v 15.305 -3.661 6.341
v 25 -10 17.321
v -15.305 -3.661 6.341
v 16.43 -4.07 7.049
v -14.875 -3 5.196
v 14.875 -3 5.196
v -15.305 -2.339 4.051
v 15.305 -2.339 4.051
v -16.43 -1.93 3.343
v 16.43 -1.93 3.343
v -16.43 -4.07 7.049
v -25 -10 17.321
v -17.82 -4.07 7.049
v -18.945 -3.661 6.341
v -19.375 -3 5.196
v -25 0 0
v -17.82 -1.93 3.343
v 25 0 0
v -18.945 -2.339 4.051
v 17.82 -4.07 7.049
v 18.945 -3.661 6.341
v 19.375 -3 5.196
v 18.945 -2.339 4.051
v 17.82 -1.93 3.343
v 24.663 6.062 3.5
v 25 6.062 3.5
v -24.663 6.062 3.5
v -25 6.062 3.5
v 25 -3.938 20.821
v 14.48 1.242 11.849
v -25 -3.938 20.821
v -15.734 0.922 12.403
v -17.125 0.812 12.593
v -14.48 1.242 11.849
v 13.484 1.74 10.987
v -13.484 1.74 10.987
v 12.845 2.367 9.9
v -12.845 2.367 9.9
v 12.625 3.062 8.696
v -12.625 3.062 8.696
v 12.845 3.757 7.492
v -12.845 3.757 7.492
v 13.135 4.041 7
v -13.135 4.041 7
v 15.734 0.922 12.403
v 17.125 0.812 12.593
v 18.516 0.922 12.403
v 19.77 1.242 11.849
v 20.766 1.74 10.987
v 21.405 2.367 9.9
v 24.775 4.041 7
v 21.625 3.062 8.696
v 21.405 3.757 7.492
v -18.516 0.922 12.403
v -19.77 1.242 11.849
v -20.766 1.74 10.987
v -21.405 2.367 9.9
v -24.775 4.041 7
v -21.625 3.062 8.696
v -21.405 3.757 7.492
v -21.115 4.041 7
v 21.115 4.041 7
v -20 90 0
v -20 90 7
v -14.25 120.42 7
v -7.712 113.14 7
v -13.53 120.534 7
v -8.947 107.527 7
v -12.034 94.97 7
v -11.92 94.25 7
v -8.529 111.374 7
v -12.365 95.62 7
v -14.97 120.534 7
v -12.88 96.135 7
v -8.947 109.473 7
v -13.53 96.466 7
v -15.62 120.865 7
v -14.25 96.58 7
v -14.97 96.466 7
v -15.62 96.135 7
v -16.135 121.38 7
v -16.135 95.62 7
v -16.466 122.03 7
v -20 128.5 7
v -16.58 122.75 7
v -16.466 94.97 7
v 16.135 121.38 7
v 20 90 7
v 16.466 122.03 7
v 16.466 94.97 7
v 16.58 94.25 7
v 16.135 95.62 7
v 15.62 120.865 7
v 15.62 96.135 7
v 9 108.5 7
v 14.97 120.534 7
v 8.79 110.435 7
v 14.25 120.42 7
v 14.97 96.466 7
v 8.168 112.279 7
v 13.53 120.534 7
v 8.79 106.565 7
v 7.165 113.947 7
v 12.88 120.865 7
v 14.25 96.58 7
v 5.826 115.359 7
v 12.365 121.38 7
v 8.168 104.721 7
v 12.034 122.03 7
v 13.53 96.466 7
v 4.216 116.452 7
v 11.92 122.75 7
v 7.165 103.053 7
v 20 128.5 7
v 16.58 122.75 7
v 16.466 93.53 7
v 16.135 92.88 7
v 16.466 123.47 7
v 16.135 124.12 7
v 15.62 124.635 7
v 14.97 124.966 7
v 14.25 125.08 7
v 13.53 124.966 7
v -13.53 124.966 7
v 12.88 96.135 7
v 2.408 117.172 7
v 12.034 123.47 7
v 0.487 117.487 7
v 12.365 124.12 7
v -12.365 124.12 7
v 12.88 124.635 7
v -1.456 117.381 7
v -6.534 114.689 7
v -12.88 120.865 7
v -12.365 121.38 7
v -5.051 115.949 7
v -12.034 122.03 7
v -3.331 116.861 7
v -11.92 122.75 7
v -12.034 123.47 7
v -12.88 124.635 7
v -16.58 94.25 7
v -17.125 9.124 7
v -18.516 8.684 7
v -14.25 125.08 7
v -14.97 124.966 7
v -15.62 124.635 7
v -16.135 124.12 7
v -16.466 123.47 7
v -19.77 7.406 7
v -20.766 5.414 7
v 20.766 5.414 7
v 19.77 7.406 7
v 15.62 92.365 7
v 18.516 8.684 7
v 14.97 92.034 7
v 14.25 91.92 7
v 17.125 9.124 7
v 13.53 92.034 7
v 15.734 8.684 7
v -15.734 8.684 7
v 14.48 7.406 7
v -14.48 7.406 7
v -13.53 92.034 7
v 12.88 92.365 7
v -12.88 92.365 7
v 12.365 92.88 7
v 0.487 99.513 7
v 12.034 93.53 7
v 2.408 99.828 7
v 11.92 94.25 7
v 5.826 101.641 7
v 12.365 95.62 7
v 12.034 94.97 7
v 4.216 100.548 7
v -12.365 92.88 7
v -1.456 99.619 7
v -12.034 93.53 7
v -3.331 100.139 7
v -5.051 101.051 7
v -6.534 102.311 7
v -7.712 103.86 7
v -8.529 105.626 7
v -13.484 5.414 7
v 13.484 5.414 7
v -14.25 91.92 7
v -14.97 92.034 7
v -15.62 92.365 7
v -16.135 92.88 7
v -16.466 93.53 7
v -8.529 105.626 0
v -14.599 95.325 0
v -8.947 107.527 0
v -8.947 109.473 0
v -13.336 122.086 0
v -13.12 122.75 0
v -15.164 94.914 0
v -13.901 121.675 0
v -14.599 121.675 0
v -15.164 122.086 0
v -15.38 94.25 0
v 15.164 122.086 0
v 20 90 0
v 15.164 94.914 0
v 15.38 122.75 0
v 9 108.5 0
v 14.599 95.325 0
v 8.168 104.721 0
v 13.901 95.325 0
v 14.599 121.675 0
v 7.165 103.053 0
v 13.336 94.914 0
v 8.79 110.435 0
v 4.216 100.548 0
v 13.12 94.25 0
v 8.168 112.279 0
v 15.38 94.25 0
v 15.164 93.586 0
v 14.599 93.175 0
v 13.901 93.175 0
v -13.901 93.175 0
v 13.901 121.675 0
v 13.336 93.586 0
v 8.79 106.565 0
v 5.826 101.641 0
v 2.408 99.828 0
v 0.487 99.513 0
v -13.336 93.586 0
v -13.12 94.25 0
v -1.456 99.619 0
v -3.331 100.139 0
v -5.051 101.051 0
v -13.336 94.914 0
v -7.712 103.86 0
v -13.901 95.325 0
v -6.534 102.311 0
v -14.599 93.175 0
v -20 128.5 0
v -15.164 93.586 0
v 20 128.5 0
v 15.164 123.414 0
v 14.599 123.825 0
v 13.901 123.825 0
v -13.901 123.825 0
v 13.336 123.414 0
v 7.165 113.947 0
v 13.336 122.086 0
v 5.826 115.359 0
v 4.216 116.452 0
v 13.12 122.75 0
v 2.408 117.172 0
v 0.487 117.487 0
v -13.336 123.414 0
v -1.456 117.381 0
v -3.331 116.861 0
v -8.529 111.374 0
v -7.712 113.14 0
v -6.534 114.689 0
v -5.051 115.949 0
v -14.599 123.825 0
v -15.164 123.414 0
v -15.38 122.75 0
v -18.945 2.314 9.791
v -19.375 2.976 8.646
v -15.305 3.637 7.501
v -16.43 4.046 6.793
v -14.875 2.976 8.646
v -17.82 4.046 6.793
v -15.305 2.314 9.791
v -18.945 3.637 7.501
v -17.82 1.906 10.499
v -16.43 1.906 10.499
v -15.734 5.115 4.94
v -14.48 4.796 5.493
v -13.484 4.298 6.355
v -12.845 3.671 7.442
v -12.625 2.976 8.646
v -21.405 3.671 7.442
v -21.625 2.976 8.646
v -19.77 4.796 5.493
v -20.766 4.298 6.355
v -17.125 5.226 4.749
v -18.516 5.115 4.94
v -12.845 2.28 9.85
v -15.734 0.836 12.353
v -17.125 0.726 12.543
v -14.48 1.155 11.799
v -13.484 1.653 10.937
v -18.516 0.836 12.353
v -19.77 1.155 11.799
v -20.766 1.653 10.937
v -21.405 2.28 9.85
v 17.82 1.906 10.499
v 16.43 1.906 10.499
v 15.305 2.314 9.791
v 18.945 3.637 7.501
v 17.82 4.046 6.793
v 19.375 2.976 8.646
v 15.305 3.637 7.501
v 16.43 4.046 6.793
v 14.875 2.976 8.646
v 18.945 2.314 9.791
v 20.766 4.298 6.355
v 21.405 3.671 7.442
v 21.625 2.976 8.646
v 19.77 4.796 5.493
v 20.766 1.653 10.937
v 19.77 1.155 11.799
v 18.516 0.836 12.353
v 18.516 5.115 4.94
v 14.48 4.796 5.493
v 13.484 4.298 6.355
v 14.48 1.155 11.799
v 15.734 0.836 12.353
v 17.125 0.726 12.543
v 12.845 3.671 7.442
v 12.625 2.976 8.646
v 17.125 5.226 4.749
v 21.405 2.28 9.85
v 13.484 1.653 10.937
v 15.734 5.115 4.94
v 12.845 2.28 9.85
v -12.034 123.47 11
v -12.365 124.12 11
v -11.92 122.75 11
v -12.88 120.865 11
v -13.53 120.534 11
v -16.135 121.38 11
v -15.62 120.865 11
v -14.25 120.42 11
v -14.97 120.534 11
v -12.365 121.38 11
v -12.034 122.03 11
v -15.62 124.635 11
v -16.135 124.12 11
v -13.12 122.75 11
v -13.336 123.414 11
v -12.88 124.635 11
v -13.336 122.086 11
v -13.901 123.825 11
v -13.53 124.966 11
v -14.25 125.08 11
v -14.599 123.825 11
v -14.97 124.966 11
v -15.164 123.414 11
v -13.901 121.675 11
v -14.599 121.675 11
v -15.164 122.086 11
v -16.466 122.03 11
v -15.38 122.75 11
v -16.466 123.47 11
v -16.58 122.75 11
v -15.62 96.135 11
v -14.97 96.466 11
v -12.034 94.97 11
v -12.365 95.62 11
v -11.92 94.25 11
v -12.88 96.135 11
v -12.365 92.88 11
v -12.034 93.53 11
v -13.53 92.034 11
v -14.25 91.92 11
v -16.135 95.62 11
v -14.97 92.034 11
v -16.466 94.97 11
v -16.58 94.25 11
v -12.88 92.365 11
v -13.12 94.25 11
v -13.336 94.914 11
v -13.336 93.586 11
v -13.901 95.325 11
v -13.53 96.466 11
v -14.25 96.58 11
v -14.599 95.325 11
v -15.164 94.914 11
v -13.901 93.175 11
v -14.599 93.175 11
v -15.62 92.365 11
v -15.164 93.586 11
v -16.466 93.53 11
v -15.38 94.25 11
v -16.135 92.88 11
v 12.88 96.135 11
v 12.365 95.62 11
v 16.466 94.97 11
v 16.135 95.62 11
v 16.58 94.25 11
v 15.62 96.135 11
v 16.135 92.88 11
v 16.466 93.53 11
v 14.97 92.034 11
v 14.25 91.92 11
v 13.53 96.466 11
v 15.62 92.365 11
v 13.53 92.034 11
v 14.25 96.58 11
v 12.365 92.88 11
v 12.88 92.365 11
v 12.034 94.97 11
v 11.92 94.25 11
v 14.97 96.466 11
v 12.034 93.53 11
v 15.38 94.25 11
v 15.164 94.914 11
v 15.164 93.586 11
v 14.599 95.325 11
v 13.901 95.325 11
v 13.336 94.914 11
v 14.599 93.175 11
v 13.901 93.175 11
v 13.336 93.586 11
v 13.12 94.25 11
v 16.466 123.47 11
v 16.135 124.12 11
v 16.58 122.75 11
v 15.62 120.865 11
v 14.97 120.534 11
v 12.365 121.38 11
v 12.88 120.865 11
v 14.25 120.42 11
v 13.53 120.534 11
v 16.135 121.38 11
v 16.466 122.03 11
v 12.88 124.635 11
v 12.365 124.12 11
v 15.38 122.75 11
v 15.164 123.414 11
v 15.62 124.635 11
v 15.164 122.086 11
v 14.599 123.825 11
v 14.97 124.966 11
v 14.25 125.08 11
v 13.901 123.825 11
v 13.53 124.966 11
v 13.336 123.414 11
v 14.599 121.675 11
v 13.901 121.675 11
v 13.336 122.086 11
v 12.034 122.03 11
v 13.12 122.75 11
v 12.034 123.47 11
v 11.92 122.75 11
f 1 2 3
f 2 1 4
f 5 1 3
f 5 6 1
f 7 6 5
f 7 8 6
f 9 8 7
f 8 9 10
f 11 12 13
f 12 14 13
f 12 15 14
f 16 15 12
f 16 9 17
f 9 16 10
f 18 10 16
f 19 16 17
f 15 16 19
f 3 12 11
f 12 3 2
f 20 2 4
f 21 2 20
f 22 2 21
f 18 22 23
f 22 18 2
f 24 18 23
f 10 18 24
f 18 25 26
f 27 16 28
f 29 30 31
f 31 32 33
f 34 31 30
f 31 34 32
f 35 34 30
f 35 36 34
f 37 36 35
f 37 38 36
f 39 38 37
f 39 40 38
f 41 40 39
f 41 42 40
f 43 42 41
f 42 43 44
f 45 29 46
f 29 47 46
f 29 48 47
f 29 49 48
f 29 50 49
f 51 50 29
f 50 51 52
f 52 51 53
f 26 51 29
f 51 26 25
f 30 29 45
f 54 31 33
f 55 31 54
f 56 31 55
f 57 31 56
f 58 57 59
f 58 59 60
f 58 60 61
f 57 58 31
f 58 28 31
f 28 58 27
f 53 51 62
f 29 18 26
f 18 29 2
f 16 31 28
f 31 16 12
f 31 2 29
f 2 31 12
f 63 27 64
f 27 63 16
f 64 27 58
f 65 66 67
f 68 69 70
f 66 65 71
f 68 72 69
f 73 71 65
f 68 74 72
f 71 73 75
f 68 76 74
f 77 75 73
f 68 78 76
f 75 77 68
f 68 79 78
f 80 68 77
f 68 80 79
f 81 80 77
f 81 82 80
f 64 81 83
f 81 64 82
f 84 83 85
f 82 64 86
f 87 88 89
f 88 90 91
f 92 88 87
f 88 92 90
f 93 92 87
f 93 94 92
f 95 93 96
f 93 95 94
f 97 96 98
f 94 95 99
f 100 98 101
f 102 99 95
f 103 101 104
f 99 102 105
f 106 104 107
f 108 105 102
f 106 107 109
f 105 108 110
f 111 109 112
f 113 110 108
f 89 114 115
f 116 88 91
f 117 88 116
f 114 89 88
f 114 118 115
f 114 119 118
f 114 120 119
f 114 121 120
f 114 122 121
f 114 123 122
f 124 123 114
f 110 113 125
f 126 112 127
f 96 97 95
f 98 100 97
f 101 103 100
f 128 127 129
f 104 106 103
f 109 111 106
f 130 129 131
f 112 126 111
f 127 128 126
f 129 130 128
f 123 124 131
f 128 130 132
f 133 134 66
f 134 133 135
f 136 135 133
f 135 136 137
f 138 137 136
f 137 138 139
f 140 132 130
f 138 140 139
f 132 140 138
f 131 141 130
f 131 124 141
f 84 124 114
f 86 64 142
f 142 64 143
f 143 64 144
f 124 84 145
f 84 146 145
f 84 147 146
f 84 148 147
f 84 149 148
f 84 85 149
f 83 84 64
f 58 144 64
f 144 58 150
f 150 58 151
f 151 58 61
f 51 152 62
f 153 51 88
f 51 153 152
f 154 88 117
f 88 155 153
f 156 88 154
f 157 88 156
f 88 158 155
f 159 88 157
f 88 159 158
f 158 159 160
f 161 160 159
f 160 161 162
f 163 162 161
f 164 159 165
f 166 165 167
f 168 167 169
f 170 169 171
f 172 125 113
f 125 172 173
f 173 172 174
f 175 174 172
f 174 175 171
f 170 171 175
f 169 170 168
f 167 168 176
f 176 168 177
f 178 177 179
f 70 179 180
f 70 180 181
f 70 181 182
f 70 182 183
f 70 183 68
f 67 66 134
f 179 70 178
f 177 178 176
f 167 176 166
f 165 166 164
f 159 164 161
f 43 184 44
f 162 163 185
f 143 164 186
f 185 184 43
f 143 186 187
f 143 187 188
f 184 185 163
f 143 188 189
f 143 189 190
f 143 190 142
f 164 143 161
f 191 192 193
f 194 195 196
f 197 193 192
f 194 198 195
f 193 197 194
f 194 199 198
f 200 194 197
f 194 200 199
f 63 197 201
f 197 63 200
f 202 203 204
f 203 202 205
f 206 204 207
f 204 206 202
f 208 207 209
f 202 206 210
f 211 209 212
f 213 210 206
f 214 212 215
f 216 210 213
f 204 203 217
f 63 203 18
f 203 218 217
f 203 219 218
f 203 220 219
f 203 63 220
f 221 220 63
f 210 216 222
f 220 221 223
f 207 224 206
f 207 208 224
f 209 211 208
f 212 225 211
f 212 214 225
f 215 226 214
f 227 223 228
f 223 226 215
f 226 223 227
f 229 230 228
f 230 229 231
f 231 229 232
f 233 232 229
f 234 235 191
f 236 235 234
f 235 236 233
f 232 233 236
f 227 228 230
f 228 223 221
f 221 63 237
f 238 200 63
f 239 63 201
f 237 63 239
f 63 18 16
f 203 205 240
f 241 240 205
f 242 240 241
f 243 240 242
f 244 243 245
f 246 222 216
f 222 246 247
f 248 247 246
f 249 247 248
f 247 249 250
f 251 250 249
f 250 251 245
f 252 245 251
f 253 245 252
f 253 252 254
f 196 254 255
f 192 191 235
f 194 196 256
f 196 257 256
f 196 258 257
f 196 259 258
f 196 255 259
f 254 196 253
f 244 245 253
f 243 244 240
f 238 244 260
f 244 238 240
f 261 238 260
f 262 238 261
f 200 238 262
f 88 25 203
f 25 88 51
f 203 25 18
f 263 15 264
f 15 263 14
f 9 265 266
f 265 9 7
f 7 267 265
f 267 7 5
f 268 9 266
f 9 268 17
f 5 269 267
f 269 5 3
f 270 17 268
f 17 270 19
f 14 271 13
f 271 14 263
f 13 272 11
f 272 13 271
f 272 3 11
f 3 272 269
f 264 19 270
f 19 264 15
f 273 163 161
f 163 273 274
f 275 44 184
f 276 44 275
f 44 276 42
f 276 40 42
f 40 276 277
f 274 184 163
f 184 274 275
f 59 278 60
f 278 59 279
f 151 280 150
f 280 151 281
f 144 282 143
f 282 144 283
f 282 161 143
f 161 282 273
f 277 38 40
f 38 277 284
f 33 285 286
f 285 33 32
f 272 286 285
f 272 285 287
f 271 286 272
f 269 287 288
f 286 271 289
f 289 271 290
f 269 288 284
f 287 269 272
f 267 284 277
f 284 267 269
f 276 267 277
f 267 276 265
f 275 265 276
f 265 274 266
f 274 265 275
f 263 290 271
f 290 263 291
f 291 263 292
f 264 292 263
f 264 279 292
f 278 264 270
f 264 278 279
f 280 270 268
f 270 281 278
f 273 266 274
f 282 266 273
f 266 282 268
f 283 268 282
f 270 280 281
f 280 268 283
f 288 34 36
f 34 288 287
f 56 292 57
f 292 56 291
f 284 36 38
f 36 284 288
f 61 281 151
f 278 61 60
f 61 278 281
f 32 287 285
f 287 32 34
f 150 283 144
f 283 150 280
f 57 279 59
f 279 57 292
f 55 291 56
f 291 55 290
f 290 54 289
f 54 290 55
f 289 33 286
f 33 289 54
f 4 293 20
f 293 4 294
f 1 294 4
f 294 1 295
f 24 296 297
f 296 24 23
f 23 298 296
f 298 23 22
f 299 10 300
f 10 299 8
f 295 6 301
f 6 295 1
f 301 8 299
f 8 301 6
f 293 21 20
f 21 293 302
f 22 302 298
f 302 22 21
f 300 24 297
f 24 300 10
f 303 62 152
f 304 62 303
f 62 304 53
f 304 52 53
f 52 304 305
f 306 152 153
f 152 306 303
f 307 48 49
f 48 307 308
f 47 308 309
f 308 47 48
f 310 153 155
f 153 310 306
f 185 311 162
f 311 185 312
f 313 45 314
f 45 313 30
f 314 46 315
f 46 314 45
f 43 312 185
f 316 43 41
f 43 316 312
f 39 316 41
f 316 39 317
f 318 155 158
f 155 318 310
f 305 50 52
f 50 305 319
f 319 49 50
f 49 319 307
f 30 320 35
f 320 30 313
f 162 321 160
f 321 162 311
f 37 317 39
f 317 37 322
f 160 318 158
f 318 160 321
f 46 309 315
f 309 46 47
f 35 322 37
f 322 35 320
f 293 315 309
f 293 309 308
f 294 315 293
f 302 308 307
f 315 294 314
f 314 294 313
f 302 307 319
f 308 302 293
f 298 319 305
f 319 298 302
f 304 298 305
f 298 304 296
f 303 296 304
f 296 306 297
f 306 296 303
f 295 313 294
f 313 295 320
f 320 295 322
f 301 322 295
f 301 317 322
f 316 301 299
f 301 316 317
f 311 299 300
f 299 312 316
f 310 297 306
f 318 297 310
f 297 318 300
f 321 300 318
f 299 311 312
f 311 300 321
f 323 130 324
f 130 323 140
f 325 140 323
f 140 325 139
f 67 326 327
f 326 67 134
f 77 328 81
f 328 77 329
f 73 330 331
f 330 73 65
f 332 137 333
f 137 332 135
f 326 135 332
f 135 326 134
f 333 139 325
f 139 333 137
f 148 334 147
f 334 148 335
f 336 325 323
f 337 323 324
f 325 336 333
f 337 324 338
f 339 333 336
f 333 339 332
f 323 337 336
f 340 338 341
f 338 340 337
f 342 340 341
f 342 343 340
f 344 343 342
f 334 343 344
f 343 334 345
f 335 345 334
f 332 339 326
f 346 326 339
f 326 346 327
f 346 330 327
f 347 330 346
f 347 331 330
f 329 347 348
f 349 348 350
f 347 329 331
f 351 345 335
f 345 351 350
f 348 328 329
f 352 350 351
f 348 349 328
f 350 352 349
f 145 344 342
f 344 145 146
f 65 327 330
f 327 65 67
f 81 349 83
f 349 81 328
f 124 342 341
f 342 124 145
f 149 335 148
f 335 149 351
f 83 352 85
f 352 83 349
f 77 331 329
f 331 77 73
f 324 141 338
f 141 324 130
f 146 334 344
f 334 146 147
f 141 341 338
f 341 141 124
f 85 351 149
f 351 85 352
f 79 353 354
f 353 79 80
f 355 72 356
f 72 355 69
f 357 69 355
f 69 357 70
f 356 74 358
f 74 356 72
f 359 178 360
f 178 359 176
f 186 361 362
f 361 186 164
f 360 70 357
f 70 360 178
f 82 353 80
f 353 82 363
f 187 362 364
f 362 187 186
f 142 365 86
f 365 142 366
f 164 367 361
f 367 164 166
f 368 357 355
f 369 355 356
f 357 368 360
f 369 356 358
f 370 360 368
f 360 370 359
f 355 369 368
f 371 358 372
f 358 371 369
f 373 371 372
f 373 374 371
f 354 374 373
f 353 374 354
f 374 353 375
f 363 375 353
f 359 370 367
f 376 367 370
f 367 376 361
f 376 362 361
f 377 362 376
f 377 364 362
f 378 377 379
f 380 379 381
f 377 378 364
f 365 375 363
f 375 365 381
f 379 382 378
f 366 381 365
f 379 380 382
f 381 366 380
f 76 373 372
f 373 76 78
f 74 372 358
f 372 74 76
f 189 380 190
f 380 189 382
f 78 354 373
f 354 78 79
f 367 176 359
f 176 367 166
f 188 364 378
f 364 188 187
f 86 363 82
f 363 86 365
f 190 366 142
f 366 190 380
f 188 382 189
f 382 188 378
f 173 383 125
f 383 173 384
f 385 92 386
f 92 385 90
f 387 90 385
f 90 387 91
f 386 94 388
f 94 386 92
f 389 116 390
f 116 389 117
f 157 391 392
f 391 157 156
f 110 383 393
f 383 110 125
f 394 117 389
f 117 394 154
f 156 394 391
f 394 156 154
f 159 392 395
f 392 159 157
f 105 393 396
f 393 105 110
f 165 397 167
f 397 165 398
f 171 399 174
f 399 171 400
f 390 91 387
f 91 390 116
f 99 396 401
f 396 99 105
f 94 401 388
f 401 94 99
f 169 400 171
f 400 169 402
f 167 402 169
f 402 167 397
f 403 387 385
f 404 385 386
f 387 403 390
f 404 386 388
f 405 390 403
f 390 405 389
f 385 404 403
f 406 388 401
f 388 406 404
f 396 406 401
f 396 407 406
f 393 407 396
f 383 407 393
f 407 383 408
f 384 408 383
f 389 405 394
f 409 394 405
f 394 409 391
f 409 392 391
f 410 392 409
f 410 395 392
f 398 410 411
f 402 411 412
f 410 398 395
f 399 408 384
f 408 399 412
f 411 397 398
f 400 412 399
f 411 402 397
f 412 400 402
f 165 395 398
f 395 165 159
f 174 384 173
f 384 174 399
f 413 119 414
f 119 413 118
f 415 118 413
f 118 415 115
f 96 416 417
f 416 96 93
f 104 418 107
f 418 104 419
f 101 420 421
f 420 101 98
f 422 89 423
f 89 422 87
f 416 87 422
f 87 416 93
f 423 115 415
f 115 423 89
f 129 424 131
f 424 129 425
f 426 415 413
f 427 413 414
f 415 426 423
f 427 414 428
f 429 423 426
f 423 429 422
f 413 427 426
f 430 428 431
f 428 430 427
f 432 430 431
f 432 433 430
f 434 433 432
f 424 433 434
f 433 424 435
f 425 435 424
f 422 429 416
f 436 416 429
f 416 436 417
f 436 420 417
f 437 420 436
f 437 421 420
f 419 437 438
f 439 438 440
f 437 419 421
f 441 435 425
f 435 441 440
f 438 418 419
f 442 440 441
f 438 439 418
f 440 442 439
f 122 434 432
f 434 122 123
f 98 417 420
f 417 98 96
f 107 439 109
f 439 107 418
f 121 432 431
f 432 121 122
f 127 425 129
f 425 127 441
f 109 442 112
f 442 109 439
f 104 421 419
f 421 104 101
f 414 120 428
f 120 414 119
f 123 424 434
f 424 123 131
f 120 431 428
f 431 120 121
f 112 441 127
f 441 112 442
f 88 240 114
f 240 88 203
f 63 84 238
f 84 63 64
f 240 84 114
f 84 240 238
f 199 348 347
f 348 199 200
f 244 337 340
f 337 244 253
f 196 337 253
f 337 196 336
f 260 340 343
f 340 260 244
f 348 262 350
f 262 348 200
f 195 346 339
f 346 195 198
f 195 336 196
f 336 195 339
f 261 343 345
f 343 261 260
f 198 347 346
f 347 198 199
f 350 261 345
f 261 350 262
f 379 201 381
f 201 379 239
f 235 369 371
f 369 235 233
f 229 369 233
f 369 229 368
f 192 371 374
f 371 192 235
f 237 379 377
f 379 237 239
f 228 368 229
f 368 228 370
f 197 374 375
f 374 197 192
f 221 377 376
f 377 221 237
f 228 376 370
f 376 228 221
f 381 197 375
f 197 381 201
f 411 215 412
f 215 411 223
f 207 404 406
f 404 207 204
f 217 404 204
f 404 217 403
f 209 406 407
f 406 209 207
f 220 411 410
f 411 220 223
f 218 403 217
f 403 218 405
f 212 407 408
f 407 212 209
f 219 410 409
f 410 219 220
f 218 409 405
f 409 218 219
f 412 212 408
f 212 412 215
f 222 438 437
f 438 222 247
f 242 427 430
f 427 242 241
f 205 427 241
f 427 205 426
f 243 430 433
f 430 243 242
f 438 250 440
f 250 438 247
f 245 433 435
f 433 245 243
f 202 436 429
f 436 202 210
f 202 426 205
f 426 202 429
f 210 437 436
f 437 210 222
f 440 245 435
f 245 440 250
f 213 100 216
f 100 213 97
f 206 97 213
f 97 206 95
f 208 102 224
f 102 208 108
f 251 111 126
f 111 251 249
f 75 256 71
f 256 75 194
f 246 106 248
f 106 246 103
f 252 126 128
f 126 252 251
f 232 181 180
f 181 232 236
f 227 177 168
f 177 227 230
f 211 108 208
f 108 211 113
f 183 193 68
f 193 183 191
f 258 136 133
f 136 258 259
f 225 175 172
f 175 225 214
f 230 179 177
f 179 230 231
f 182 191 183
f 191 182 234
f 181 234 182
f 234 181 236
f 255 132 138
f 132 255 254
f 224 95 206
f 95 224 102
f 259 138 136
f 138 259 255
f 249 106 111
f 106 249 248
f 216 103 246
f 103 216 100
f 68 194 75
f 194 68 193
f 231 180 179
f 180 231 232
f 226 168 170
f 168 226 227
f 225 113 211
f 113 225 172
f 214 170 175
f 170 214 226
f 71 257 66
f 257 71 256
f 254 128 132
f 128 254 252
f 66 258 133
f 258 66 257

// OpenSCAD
thickness = 7;
cam_border = 3;
arducam_width = 37;
arducam_height = 37;
arducam_mount = [
  [-28.5/2, 28.5/2],
  [-28.5/2, -28.5/2],
  [28.5/2, -28.5/2],
  [28.5/2, 28.5/2],
];
arducam_lens_diam = 18;
screw_diam = 2.26;  // #4-40
screw_wall_thickness = 1.2;  // must be a multiple of nozzle size 0.4
support_offset = 4;

module CameraMount() {
  difference() {
    union() {
      translate([-(cam_border + arducam_width)/2, -(cam_border + arducam_height)/2, 0])
        cube([cam_border + arducam_width, cam_border + arducam_height, thickness]);
      for (h = arducam_mount) {
        translate([h[0], h[1], thickness - 0.1]) {
          cylinder(d=screw_diam + 2*screw_wall_thickness, h=support_offset + 0.1, $fn=20);
        }
      }
    }
    for (h = arducam_mount) {
      translate([h[0], h[1], -0.1]) {
        cylinder(d=screw_diam, h=thickness + 10, $fn=10);
      }
    }
    // hole for lens
    translate([0, 0, -0.1])
      cylinder(d=arducam_lens_diam, h=thickness + 3);
  }
}

module BumperSpar(sparlen) {
  rotate([90, 0, 0]) rotate([0, 90, 0]) linear_extrude(height = 2)
    polygon(points=[
      [-1.72, 3.0],
      [sparlen, 3], [sparlen, -0.1], [0, -0.1], [-1.72, 3.0]]);
}

bb_len = 90;
module BumperBracket() {
  // 30.75 inner to inner
  // 3.5mm diameter holes (we will probably have to drill out)
  // 60 deg angle from vertical
  difference() {
    union() {
      rotate([-60, 0, 0]) {
        translate([-25, -20, 0])
          cube([50, 20, thickness]);
      }
      linear_extrude(height = thickness)
        polygon(points=[
            [-25, 0],
            [-(cam_border + arducam_width)/2, bb_len],
            [(cam_border + arducam_width)/2, bb_len],
            [25, 0], [-25, 0]]);
    }
    // translate([-12, 0, 1.0]) BumperSpar(bb_len - 5);
    // translate([10, 0, 1.0]) BumperSpar(bb_len - 5);
    rotate([-60, 0, 0]) {
      translate([-30.75/2 - 3.5/2, -6, -0.1])
        cylinder(d=4.5, h=thickness + 1, $fn=10);
      translate([-30.75/2 - 3.5/2, -6, thickness-0.1])
        cylinder(d=9, h=thickness + 1, $fn=20);
      translate([30.75/2 + 3.5/2, -6, -0.1])
        cylinder(d=4.5, h=thickness + 1, $fn=10);
      translate([30.75/2 + 3.5/2, -6, thickness-0.1])
        cylinder(d=9, h=thickness + 1, $fn=20);
    }
  }
}

BumperBracket();
translate([0, bb_len+arducam_height/2, 0]) CameraMount();
